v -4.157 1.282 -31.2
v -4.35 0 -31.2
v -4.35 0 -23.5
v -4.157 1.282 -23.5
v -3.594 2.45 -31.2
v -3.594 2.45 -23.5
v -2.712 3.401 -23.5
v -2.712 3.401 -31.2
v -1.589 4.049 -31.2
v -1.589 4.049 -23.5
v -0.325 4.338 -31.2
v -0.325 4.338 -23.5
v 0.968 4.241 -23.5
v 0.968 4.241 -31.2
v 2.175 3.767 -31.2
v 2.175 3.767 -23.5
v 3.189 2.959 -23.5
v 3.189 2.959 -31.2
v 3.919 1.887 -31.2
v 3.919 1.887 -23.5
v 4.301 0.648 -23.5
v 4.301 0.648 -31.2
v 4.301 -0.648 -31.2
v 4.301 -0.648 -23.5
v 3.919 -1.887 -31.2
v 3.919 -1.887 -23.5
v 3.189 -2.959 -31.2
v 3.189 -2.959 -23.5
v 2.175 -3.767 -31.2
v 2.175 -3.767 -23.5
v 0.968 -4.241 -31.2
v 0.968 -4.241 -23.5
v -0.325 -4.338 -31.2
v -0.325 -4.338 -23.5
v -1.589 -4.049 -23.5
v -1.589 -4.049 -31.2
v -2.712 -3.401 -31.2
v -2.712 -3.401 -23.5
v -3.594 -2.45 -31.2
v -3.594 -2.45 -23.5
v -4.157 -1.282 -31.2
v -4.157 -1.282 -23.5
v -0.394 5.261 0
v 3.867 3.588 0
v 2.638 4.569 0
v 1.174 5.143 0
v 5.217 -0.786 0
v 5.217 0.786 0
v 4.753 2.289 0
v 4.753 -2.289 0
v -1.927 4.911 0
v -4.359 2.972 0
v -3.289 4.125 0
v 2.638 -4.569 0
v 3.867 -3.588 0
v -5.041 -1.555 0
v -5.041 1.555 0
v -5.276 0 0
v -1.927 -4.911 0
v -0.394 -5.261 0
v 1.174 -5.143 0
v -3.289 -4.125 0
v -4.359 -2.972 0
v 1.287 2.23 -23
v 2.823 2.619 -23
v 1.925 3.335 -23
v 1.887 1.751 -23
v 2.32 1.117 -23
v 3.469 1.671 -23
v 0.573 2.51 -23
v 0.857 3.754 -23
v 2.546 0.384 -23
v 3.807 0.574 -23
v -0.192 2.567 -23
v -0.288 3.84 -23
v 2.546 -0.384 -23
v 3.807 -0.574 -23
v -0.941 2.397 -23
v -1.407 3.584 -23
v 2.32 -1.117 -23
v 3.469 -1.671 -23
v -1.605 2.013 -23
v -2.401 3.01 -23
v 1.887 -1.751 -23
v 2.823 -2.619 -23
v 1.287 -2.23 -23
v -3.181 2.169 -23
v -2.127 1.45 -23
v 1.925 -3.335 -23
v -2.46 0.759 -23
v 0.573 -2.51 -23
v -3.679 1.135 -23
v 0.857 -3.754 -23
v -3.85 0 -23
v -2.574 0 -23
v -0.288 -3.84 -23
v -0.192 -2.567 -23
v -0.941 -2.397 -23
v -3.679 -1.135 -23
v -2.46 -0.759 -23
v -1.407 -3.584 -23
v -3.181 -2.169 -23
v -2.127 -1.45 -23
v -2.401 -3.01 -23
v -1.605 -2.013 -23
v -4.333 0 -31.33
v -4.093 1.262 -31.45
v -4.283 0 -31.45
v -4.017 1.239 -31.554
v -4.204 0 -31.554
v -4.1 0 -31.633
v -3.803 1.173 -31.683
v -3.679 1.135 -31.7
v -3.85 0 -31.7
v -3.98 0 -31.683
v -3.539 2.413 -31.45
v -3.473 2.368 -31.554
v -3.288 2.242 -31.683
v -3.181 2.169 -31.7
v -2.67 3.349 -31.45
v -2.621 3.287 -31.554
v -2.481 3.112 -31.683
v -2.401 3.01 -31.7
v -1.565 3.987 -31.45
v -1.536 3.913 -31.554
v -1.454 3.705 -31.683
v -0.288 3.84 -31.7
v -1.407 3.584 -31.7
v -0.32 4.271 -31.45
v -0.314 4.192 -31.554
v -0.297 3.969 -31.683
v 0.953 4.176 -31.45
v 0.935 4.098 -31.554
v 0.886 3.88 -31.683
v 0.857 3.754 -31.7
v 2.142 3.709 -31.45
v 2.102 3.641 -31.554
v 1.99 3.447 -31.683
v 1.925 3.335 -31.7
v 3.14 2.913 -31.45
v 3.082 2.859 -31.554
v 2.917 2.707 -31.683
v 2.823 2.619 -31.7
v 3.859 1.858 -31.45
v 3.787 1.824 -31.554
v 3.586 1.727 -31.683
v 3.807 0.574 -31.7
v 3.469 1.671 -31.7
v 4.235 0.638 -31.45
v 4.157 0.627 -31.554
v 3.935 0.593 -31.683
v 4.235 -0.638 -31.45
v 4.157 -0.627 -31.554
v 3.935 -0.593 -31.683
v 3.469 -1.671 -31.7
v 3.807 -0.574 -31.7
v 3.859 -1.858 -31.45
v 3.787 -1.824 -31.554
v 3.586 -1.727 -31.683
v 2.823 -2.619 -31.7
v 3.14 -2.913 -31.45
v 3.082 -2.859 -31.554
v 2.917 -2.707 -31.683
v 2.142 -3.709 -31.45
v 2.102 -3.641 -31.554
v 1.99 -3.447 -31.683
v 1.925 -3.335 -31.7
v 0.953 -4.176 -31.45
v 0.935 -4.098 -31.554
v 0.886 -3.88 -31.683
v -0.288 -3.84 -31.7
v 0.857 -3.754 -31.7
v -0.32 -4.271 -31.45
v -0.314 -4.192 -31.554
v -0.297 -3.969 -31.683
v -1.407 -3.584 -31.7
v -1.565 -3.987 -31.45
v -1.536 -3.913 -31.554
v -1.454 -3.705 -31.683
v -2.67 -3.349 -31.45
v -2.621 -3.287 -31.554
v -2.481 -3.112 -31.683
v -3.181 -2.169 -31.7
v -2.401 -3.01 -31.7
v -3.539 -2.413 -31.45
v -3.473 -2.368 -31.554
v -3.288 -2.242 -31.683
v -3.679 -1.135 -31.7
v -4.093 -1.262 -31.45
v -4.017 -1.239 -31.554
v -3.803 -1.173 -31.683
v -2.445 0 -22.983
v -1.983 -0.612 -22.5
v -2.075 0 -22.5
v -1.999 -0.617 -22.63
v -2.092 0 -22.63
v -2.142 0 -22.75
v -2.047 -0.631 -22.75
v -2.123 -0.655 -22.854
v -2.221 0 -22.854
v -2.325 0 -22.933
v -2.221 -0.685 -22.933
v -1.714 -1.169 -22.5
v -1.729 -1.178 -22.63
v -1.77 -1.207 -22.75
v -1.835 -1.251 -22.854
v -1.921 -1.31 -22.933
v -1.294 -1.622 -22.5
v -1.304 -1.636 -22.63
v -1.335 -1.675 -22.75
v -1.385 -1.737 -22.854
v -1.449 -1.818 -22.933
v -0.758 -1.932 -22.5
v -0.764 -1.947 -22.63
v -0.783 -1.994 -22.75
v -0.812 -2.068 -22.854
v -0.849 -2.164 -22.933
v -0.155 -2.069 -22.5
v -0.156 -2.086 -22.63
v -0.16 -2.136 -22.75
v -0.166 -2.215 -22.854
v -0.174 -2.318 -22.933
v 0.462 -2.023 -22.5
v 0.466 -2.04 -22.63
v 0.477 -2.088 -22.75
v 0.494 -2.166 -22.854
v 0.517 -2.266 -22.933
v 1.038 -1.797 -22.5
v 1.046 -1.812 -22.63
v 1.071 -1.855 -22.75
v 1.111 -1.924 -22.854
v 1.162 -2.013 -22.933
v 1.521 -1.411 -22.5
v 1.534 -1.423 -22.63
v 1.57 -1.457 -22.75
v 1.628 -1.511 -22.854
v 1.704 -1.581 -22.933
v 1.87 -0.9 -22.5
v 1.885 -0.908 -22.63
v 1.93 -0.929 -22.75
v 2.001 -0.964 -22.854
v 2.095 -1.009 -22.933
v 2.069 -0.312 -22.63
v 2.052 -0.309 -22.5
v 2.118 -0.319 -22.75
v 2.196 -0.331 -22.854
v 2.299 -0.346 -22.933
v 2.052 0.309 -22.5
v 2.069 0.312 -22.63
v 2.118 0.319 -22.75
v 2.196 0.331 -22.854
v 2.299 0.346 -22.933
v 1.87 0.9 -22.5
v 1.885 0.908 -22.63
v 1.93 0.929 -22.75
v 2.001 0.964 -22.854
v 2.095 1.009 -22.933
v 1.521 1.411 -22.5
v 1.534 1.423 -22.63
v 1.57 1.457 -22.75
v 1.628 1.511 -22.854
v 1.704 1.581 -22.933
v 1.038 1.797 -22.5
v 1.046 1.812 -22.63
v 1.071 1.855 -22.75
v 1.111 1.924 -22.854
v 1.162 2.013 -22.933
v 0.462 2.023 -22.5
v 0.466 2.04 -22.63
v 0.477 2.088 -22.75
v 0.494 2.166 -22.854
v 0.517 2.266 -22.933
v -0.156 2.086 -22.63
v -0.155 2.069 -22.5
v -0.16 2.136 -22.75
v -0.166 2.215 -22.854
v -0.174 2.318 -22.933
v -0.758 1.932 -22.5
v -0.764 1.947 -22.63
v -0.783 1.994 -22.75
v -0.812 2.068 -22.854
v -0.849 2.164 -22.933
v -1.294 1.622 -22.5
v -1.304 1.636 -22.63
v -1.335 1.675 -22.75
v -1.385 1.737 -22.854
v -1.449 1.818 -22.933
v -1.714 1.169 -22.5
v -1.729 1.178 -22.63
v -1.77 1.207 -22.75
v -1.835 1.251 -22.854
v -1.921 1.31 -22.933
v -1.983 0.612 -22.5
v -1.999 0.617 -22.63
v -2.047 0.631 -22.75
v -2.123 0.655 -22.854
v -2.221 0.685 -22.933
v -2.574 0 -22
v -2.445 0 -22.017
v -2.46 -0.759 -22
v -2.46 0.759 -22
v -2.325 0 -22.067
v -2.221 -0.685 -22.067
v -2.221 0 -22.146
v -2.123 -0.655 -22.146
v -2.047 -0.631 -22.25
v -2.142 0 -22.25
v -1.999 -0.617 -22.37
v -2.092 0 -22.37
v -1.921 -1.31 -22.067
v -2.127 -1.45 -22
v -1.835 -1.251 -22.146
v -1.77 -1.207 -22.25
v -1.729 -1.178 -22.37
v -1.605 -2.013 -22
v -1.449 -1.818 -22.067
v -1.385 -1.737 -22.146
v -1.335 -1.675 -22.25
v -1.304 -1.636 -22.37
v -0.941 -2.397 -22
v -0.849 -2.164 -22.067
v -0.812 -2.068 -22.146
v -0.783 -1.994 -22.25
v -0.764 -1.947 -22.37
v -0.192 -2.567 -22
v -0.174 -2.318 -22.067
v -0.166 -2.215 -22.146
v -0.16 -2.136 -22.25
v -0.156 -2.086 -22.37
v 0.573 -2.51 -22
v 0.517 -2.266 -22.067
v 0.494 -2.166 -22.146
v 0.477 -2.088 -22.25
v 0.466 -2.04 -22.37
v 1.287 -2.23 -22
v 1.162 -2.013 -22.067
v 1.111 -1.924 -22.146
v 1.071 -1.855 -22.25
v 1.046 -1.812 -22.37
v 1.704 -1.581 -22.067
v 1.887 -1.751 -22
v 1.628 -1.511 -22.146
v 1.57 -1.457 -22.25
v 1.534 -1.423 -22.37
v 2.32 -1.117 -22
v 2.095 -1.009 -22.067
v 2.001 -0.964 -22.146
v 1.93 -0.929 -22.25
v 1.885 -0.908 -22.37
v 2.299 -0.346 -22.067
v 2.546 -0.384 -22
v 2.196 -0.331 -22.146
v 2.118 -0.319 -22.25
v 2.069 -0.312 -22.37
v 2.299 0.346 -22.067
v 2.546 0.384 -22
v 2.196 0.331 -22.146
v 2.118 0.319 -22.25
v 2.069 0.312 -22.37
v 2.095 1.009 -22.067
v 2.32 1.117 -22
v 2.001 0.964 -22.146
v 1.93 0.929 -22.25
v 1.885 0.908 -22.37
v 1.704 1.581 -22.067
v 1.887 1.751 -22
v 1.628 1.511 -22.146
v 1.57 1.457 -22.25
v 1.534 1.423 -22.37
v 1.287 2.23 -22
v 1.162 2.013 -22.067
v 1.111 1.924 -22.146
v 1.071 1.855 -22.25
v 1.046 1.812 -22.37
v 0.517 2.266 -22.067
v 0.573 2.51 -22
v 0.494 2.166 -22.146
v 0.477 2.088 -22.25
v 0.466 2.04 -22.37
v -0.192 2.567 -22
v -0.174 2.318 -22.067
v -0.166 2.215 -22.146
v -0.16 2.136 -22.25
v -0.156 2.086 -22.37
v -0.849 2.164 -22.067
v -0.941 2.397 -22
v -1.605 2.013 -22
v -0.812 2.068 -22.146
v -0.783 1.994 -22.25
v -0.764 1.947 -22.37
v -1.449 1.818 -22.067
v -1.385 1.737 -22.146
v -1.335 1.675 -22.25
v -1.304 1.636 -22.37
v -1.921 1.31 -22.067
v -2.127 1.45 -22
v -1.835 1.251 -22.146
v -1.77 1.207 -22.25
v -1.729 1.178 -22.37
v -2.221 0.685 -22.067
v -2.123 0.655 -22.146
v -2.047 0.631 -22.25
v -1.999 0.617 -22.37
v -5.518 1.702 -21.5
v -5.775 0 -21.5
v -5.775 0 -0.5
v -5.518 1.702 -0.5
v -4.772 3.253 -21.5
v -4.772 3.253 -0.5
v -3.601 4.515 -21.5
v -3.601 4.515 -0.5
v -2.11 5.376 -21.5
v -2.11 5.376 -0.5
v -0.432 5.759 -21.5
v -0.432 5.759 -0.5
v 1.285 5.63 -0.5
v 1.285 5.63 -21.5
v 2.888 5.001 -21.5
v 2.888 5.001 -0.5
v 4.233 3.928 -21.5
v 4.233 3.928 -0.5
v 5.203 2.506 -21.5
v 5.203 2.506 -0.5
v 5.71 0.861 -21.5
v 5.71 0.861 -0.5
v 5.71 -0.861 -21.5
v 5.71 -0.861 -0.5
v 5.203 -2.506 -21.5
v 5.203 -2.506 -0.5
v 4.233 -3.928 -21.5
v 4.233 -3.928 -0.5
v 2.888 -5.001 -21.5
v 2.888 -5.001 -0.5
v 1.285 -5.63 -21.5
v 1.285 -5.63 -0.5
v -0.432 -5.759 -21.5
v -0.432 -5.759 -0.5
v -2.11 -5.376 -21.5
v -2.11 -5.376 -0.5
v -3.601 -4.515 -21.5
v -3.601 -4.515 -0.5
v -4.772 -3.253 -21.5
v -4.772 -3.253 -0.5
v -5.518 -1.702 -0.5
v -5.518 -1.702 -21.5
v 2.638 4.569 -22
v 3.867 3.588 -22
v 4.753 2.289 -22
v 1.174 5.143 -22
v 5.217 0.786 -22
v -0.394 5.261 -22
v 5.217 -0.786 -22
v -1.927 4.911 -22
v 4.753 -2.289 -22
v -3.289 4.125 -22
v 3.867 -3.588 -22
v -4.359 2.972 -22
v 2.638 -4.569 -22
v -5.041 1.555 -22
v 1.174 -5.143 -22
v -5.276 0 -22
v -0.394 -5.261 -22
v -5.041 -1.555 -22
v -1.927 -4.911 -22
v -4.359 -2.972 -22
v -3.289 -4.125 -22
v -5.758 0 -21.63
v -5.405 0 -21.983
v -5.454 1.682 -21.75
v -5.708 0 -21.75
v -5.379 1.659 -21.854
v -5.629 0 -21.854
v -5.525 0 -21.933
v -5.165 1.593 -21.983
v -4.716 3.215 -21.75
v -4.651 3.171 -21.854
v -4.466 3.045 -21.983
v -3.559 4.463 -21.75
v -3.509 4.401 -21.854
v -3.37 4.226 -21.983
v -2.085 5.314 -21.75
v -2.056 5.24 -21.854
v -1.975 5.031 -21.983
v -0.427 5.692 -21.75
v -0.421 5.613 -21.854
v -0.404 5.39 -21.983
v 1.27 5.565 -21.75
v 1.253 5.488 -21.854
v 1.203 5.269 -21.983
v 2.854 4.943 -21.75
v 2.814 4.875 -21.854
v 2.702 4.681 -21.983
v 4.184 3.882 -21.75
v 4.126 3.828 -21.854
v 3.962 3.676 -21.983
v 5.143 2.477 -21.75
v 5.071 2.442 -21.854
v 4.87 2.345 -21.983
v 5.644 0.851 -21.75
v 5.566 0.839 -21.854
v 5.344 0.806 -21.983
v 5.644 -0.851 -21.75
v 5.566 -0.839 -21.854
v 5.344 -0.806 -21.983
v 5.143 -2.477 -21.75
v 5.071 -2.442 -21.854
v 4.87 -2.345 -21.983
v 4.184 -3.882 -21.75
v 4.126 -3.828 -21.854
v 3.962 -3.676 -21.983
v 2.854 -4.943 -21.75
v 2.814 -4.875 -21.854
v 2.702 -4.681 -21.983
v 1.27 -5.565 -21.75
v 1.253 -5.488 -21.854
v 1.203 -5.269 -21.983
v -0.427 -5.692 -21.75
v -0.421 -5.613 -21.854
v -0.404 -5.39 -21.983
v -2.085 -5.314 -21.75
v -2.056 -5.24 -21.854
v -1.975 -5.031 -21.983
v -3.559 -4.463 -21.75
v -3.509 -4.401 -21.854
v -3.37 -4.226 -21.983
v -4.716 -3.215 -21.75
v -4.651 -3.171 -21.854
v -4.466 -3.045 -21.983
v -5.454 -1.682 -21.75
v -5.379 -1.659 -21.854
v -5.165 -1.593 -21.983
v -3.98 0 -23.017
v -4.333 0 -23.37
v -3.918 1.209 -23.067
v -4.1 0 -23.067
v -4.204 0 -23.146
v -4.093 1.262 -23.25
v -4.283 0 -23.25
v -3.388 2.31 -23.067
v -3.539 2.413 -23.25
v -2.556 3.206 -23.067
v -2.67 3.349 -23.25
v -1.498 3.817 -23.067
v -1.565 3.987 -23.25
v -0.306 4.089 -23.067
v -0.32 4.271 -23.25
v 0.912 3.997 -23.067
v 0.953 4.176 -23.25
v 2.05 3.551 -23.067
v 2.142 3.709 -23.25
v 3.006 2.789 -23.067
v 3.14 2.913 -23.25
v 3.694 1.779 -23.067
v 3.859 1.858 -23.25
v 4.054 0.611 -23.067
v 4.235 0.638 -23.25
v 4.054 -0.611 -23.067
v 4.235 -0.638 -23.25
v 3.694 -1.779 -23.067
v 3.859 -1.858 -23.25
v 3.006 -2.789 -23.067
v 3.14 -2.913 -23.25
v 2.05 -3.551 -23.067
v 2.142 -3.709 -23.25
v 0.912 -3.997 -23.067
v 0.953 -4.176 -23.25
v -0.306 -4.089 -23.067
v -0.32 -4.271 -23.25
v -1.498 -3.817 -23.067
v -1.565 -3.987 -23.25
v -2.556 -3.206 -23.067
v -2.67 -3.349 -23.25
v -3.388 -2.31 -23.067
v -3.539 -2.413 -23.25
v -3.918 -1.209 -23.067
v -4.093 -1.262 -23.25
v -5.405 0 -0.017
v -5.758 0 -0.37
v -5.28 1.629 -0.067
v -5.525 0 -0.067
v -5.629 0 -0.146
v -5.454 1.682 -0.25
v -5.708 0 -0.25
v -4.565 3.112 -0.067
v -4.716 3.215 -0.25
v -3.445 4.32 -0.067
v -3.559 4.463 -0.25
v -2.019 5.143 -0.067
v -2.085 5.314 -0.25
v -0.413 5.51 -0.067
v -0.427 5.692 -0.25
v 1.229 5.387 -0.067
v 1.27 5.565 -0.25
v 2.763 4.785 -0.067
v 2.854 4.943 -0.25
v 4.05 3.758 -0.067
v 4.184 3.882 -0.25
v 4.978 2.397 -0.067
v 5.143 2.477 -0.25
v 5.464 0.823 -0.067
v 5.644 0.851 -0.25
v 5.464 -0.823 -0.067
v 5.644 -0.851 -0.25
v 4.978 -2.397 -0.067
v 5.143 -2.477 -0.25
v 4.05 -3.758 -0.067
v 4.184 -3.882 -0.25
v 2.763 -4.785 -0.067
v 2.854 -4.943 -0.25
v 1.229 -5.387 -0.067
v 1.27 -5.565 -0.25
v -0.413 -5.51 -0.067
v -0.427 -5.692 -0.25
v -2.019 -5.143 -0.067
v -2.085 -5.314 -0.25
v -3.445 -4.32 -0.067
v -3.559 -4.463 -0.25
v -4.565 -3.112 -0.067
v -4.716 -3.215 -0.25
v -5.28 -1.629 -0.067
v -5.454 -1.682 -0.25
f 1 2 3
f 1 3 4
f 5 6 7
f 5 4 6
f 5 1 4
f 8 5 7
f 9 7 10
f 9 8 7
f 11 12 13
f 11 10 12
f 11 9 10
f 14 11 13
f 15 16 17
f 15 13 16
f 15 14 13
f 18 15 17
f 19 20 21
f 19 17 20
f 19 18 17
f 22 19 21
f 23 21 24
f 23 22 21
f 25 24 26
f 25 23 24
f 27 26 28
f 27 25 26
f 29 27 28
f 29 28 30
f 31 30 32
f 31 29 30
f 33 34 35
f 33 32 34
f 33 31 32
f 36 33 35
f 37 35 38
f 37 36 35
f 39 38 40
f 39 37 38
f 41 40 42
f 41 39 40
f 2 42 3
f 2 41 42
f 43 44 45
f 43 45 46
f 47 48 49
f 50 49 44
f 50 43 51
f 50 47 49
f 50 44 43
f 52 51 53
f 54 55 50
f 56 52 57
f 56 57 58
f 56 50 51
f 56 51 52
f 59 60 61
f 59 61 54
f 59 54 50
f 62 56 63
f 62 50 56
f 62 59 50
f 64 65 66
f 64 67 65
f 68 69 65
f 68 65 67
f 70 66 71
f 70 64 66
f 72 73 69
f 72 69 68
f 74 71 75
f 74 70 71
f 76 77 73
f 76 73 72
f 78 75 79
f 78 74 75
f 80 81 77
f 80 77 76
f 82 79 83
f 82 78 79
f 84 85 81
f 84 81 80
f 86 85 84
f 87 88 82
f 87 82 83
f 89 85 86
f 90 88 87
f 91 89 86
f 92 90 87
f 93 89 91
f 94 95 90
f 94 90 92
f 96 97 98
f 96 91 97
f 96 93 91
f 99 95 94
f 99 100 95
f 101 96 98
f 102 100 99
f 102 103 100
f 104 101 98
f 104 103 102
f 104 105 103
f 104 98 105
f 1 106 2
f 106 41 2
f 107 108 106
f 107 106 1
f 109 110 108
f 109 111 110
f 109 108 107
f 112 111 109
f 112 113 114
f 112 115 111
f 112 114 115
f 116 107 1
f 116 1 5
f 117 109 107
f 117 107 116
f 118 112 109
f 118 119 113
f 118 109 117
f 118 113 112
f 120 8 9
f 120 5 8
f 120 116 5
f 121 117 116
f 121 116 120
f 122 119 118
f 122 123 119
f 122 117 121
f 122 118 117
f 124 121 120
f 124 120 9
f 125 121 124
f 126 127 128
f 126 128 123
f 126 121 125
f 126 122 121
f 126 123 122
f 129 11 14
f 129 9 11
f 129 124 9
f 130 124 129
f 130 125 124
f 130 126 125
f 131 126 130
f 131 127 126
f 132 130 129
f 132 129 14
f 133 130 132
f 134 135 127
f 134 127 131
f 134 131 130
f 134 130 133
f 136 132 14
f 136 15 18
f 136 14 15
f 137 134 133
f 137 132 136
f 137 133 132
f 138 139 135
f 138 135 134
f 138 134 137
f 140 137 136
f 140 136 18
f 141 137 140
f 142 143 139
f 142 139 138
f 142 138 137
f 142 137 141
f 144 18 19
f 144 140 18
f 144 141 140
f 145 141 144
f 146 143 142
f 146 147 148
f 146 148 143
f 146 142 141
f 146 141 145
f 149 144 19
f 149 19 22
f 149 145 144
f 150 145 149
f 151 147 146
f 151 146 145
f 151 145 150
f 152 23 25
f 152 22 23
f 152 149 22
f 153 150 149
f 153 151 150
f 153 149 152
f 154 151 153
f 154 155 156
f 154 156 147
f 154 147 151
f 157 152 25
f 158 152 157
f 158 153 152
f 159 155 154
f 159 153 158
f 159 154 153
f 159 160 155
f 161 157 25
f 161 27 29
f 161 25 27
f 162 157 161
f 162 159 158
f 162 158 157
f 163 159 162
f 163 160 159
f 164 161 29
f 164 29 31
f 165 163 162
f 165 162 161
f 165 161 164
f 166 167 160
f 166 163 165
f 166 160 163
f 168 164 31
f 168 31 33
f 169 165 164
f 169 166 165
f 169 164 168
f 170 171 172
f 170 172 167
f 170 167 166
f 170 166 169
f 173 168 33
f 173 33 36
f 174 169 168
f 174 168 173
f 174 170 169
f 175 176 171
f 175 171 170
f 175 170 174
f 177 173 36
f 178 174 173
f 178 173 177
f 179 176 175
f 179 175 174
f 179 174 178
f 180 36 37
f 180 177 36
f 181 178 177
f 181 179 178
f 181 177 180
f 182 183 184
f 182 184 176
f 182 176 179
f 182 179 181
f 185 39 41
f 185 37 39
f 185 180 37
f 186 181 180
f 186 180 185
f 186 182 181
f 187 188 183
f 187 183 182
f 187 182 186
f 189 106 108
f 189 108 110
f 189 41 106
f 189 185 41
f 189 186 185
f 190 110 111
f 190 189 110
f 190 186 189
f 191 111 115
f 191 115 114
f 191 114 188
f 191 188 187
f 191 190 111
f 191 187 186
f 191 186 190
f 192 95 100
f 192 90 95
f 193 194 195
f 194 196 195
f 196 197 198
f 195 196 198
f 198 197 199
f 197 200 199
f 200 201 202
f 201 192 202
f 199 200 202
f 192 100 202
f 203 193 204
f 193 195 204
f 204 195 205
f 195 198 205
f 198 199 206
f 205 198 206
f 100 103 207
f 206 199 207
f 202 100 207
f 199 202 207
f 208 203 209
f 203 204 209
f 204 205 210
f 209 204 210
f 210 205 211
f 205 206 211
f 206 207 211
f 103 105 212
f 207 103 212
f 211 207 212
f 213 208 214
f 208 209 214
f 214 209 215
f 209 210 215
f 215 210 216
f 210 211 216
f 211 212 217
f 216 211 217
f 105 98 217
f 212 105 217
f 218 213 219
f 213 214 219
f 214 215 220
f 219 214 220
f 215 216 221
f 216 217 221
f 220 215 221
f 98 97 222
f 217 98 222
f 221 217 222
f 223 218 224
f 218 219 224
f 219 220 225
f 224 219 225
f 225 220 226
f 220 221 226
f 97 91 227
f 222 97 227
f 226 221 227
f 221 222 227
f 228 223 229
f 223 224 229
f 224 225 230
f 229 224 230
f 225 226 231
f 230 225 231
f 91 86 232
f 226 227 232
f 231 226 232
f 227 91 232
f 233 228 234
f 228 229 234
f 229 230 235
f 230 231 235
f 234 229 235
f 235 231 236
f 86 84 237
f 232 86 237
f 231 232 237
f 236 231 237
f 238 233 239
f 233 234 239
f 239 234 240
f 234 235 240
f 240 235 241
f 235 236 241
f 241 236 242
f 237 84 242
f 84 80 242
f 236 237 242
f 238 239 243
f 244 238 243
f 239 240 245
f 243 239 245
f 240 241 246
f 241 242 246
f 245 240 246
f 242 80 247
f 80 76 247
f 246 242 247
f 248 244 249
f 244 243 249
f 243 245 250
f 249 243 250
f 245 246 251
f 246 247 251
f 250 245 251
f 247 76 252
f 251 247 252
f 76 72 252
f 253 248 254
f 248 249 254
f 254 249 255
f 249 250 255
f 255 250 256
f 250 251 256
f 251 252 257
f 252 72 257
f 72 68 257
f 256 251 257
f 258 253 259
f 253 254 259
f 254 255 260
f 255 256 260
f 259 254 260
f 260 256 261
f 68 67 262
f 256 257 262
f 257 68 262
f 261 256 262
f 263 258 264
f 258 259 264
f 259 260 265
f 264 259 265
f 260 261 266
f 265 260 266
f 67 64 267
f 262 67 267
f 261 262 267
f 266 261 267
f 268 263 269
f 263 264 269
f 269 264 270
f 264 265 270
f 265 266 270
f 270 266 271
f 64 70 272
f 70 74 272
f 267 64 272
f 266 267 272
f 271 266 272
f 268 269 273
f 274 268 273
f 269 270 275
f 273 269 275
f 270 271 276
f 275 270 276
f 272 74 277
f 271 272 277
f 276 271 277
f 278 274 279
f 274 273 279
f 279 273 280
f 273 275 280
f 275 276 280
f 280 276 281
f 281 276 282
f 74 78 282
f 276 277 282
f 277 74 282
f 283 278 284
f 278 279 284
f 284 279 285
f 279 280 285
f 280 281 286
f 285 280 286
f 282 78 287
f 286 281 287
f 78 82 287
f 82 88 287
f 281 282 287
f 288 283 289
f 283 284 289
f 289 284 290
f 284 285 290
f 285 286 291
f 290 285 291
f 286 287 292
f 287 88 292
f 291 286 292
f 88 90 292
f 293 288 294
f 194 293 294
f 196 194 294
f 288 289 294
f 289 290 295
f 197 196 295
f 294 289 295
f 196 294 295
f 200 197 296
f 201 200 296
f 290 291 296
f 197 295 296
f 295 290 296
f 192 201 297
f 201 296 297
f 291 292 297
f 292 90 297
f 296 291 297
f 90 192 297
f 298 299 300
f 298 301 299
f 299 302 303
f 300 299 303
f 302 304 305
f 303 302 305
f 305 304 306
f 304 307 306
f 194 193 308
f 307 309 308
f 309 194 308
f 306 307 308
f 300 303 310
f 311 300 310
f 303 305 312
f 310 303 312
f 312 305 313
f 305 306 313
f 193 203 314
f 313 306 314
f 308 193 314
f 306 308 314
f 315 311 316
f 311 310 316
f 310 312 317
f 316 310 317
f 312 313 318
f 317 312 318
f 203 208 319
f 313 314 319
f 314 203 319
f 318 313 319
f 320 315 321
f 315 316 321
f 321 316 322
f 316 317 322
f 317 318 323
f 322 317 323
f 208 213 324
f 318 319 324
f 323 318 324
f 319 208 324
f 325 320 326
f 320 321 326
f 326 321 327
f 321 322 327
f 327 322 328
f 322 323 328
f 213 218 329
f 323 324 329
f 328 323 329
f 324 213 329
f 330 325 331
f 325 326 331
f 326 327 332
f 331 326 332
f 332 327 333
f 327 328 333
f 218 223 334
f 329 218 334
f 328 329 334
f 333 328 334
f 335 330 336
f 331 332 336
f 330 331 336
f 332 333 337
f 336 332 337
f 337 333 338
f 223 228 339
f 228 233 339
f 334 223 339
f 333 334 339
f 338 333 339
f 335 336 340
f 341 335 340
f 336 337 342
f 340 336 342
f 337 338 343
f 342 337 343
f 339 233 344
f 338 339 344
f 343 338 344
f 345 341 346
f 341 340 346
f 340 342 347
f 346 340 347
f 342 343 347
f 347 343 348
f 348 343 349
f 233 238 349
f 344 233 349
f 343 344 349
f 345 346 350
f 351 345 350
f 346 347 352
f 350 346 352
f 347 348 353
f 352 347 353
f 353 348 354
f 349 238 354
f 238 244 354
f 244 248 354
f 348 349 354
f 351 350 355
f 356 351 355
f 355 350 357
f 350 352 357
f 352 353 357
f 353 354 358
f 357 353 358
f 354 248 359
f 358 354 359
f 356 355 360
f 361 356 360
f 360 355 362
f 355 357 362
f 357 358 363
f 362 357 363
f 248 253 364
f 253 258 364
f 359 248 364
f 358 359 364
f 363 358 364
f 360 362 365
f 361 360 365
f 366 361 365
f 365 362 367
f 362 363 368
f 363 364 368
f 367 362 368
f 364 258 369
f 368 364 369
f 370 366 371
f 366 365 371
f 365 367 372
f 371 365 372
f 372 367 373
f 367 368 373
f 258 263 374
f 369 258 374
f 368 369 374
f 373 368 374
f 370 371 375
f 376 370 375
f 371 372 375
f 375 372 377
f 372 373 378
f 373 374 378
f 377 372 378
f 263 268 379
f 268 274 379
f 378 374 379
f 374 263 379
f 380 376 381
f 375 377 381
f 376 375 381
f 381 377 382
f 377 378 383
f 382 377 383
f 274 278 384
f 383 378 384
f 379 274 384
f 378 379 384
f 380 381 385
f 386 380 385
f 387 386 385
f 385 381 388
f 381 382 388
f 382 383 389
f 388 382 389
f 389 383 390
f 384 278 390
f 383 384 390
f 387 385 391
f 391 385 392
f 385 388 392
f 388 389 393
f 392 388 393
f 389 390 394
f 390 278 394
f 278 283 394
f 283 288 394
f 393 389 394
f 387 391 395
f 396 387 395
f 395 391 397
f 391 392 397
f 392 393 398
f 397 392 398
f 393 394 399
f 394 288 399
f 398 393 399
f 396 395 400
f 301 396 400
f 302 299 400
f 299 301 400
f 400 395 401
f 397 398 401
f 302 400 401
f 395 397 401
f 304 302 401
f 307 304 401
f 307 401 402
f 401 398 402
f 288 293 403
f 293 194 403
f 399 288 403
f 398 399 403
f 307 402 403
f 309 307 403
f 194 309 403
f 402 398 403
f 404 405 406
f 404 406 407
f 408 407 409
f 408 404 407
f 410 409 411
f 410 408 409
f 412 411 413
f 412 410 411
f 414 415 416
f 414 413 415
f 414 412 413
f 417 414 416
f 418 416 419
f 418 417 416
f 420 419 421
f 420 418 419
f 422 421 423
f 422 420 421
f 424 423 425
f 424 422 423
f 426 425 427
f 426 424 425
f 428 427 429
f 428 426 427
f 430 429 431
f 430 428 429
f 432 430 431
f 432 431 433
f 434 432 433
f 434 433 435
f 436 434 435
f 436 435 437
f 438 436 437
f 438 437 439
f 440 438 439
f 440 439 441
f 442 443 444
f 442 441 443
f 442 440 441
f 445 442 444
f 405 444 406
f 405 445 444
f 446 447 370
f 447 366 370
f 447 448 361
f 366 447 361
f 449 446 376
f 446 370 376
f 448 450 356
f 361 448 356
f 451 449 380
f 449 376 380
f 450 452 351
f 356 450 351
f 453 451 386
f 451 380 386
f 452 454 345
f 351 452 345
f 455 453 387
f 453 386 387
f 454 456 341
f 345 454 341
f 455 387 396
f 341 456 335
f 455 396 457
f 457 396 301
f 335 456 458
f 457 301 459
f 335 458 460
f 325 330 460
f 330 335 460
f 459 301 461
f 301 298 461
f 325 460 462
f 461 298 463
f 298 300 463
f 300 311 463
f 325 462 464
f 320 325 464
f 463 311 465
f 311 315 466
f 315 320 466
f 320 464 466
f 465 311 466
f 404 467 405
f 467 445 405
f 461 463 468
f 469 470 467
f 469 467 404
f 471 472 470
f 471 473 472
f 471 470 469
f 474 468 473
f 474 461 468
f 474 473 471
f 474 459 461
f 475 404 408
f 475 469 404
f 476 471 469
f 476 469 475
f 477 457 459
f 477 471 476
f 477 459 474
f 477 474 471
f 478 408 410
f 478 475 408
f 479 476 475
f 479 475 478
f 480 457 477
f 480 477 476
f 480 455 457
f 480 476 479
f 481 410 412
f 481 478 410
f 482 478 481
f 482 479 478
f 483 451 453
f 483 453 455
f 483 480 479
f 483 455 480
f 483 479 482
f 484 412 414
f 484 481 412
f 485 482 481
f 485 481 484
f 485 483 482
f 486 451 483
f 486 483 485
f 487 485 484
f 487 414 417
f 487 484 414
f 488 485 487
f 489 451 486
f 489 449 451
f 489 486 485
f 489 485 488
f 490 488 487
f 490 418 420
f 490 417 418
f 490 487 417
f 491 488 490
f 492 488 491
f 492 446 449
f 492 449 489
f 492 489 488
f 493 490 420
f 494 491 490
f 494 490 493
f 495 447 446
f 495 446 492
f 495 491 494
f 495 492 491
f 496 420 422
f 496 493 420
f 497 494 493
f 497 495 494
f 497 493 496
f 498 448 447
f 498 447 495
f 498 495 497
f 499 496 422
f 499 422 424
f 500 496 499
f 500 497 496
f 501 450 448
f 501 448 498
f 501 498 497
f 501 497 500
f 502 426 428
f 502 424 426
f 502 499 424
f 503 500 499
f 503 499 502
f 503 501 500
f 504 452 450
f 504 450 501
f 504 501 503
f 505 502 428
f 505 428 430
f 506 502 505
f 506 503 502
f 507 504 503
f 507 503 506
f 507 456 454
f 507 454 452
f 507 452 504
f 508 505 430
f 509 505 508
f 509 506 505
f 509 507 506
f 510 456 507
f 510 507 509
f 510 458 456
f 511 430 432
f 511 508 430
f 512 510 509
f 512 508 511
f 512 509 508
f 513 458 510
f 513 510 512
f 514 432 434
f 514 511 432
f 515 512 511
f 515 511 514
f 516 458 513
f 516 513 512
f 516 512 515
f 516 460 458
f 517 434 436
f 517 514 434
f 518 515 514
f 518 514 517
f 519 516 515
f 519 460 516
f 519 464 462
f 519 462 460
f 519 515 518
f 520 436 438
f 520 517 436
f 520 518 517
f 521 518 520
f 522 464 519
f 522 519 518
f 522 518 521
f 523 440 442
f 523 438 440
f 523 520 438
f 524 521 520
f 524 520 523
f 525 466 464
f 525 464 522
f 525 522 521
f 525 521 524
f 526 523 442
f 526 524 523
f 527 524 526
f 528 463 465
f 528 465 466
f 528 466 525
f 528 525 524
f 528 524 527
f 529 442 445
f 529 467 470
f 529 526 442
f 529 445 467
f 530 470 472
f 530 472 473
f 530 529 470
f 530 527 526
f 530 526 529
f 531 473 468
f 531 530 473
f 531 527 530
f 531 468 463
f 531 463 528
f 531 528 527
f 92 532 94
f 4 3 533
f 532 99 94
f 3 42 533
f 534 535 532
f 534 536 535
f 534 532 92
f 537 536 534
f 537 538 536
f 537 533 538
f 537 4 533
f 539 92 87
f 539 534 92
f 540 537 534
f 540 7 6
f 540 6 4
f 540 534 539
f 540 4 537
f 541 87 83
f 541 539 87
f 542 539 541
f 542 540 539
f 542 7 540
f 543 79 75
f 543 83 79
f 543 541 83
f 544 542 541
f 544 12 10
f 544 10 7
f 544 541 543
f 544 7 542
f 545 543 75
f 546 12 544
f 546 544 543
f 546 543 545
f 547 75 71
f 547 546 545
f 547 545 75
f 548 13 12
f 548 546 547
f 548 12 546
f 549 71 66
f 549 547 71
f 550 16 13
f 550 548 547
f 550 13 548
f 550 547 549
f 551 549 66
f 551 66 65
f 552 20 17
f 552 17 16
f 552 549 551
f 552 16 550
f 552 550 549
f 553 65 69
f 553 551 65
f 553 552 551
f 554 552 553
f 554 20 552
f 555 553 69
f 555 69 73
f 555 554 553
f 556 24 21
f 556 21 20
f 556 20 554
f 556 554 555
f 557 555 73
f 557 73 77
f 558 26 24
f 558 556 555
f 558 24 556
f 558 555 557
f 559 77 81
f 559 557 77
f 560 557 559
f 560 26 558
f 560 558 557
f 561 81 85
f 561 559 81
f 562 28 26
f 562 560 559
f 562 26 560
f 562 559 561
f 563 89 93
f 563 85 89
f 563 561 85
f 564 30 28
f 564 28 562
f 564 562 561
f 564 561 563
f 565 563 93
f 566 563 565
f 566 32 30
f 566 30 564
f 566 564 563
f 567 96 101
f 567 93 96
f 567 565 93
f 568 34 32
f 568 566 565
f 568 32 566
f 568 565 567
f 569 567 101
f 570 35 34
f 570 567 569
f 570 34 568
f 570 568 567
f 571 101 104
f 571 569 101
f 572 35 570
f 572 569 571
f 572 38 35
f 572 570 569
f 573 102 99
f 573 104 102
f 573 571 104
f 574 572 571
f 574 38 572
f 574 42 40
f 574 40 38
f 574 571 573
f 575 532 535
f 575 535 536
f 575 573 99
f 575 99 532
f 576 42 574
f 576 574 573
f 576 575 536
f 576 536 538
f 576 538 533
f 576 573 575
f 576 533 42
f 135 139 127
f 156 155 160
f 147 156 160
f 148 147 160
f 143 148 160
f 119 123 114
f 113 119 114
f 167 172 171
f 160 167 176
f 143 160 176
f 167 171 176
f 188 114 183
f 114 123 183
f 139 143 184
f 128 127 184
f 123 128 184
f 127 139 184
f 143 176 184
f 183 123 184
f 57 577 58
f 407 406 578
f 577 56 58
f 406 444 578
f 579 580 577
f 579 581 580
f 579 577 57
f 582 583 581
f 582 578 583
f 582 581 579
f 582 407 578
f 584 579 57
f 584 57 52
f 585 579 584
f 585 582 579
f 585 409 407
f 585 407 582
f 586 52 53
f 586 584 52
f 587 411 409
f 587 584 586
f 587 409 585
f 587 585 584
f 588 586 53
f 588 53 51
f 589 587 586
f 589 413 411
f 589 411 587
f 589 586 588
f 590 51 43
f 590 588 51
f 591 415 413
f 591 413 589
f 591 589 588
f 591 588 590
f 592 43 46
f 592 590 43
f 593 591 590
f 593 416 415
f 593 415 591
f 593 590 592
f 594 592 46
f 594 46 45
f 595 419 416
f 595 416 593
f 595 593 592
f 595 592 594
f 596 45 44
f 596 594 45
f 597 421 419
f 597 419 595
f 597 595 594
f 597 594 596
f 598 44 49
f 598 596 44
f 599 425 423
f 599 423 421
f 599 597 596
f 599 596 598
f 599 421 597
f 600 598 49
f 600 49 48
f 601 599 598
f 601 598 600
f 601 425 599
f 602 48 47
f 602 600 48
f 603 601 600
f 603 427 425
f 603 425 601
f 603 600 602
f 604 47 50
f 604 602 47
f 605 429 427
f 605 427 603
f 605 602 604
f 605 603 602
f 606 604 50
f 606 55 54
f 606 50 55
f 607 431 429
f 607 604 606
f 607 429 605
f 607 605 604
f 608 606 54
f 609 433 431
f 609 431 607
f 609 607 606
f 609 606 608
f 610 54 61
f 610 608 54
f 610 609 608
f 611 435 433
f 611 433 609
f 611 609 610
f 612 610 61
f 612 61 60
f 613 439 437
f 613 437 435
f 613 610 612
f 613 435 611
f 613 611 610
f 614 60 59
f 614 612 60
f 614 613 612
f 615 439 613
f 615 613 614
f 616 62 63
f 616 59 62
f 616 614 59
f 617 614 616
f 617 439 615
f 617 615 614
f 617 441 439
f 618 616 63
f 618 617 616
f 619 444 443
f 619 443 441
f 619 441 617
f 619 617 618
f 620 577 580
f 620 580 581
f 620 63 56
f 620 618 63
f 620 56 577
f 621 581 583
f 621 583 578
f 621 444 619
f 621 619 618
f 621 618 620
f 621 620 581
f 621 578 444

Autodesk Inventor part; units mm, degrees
ref_plane "YZ Plane" through (0, 0, 0) normal (1, 0, 0) x (0, 1, 0)
ref_plane "XZ Plane" through (0, 0, 0) normal (0, 1, 0) x (-1, 0, 0)
ref_plane "XY Plane" through (0, 0, 0) normal (0, 0, 1) x (1, 0, 0)
sketch "Skizze1" plane through (0, 0, 0) normal (0, 1, 0) x (-1, 0, 0)
  line L0 (0, 0) -> (5.775, 0)
  line L1 (5.775, 0) -> (5.775, -22)
  line L2 (5.775, -22) -> (2.075, -22)
  line L3 (2.075, -22) -> (2.075, -23)
  line L4 (2.075, -23) -> (4.35, -23)
  line L5 (4.35, -23) -> (4.35, -31.7)
  line L6 (4.35, -31.7) -> (0, -31.7)
  line L7 (0, -31.7) -> (0, 0)
  dimension "d0" = 5.775
  dimension "d1" = 22
  dimension "d2" = 3.7
  dimension "d3" = 1
  dimension "d4" = 8.7
  dimension "d5" = 4.35
revolve "Umdrehung1" add sketch "Skizze1" angle 360 about axis through (0, 0, -31.7) along (0, 0, 1)
fillet "Rundung1" radius 0.5 6 edges at (5.775, 0, -22) (5.775, 0, 0) (4.35, 0, -23) (4.35, 0, -31.7) (2.075, 0, -22) (2.075, 0, -23)
thread "Gewinde1" size "M9x1.25" class "6g" standard "ANSI Metric M Profile" full length
properties part number "Glas"
